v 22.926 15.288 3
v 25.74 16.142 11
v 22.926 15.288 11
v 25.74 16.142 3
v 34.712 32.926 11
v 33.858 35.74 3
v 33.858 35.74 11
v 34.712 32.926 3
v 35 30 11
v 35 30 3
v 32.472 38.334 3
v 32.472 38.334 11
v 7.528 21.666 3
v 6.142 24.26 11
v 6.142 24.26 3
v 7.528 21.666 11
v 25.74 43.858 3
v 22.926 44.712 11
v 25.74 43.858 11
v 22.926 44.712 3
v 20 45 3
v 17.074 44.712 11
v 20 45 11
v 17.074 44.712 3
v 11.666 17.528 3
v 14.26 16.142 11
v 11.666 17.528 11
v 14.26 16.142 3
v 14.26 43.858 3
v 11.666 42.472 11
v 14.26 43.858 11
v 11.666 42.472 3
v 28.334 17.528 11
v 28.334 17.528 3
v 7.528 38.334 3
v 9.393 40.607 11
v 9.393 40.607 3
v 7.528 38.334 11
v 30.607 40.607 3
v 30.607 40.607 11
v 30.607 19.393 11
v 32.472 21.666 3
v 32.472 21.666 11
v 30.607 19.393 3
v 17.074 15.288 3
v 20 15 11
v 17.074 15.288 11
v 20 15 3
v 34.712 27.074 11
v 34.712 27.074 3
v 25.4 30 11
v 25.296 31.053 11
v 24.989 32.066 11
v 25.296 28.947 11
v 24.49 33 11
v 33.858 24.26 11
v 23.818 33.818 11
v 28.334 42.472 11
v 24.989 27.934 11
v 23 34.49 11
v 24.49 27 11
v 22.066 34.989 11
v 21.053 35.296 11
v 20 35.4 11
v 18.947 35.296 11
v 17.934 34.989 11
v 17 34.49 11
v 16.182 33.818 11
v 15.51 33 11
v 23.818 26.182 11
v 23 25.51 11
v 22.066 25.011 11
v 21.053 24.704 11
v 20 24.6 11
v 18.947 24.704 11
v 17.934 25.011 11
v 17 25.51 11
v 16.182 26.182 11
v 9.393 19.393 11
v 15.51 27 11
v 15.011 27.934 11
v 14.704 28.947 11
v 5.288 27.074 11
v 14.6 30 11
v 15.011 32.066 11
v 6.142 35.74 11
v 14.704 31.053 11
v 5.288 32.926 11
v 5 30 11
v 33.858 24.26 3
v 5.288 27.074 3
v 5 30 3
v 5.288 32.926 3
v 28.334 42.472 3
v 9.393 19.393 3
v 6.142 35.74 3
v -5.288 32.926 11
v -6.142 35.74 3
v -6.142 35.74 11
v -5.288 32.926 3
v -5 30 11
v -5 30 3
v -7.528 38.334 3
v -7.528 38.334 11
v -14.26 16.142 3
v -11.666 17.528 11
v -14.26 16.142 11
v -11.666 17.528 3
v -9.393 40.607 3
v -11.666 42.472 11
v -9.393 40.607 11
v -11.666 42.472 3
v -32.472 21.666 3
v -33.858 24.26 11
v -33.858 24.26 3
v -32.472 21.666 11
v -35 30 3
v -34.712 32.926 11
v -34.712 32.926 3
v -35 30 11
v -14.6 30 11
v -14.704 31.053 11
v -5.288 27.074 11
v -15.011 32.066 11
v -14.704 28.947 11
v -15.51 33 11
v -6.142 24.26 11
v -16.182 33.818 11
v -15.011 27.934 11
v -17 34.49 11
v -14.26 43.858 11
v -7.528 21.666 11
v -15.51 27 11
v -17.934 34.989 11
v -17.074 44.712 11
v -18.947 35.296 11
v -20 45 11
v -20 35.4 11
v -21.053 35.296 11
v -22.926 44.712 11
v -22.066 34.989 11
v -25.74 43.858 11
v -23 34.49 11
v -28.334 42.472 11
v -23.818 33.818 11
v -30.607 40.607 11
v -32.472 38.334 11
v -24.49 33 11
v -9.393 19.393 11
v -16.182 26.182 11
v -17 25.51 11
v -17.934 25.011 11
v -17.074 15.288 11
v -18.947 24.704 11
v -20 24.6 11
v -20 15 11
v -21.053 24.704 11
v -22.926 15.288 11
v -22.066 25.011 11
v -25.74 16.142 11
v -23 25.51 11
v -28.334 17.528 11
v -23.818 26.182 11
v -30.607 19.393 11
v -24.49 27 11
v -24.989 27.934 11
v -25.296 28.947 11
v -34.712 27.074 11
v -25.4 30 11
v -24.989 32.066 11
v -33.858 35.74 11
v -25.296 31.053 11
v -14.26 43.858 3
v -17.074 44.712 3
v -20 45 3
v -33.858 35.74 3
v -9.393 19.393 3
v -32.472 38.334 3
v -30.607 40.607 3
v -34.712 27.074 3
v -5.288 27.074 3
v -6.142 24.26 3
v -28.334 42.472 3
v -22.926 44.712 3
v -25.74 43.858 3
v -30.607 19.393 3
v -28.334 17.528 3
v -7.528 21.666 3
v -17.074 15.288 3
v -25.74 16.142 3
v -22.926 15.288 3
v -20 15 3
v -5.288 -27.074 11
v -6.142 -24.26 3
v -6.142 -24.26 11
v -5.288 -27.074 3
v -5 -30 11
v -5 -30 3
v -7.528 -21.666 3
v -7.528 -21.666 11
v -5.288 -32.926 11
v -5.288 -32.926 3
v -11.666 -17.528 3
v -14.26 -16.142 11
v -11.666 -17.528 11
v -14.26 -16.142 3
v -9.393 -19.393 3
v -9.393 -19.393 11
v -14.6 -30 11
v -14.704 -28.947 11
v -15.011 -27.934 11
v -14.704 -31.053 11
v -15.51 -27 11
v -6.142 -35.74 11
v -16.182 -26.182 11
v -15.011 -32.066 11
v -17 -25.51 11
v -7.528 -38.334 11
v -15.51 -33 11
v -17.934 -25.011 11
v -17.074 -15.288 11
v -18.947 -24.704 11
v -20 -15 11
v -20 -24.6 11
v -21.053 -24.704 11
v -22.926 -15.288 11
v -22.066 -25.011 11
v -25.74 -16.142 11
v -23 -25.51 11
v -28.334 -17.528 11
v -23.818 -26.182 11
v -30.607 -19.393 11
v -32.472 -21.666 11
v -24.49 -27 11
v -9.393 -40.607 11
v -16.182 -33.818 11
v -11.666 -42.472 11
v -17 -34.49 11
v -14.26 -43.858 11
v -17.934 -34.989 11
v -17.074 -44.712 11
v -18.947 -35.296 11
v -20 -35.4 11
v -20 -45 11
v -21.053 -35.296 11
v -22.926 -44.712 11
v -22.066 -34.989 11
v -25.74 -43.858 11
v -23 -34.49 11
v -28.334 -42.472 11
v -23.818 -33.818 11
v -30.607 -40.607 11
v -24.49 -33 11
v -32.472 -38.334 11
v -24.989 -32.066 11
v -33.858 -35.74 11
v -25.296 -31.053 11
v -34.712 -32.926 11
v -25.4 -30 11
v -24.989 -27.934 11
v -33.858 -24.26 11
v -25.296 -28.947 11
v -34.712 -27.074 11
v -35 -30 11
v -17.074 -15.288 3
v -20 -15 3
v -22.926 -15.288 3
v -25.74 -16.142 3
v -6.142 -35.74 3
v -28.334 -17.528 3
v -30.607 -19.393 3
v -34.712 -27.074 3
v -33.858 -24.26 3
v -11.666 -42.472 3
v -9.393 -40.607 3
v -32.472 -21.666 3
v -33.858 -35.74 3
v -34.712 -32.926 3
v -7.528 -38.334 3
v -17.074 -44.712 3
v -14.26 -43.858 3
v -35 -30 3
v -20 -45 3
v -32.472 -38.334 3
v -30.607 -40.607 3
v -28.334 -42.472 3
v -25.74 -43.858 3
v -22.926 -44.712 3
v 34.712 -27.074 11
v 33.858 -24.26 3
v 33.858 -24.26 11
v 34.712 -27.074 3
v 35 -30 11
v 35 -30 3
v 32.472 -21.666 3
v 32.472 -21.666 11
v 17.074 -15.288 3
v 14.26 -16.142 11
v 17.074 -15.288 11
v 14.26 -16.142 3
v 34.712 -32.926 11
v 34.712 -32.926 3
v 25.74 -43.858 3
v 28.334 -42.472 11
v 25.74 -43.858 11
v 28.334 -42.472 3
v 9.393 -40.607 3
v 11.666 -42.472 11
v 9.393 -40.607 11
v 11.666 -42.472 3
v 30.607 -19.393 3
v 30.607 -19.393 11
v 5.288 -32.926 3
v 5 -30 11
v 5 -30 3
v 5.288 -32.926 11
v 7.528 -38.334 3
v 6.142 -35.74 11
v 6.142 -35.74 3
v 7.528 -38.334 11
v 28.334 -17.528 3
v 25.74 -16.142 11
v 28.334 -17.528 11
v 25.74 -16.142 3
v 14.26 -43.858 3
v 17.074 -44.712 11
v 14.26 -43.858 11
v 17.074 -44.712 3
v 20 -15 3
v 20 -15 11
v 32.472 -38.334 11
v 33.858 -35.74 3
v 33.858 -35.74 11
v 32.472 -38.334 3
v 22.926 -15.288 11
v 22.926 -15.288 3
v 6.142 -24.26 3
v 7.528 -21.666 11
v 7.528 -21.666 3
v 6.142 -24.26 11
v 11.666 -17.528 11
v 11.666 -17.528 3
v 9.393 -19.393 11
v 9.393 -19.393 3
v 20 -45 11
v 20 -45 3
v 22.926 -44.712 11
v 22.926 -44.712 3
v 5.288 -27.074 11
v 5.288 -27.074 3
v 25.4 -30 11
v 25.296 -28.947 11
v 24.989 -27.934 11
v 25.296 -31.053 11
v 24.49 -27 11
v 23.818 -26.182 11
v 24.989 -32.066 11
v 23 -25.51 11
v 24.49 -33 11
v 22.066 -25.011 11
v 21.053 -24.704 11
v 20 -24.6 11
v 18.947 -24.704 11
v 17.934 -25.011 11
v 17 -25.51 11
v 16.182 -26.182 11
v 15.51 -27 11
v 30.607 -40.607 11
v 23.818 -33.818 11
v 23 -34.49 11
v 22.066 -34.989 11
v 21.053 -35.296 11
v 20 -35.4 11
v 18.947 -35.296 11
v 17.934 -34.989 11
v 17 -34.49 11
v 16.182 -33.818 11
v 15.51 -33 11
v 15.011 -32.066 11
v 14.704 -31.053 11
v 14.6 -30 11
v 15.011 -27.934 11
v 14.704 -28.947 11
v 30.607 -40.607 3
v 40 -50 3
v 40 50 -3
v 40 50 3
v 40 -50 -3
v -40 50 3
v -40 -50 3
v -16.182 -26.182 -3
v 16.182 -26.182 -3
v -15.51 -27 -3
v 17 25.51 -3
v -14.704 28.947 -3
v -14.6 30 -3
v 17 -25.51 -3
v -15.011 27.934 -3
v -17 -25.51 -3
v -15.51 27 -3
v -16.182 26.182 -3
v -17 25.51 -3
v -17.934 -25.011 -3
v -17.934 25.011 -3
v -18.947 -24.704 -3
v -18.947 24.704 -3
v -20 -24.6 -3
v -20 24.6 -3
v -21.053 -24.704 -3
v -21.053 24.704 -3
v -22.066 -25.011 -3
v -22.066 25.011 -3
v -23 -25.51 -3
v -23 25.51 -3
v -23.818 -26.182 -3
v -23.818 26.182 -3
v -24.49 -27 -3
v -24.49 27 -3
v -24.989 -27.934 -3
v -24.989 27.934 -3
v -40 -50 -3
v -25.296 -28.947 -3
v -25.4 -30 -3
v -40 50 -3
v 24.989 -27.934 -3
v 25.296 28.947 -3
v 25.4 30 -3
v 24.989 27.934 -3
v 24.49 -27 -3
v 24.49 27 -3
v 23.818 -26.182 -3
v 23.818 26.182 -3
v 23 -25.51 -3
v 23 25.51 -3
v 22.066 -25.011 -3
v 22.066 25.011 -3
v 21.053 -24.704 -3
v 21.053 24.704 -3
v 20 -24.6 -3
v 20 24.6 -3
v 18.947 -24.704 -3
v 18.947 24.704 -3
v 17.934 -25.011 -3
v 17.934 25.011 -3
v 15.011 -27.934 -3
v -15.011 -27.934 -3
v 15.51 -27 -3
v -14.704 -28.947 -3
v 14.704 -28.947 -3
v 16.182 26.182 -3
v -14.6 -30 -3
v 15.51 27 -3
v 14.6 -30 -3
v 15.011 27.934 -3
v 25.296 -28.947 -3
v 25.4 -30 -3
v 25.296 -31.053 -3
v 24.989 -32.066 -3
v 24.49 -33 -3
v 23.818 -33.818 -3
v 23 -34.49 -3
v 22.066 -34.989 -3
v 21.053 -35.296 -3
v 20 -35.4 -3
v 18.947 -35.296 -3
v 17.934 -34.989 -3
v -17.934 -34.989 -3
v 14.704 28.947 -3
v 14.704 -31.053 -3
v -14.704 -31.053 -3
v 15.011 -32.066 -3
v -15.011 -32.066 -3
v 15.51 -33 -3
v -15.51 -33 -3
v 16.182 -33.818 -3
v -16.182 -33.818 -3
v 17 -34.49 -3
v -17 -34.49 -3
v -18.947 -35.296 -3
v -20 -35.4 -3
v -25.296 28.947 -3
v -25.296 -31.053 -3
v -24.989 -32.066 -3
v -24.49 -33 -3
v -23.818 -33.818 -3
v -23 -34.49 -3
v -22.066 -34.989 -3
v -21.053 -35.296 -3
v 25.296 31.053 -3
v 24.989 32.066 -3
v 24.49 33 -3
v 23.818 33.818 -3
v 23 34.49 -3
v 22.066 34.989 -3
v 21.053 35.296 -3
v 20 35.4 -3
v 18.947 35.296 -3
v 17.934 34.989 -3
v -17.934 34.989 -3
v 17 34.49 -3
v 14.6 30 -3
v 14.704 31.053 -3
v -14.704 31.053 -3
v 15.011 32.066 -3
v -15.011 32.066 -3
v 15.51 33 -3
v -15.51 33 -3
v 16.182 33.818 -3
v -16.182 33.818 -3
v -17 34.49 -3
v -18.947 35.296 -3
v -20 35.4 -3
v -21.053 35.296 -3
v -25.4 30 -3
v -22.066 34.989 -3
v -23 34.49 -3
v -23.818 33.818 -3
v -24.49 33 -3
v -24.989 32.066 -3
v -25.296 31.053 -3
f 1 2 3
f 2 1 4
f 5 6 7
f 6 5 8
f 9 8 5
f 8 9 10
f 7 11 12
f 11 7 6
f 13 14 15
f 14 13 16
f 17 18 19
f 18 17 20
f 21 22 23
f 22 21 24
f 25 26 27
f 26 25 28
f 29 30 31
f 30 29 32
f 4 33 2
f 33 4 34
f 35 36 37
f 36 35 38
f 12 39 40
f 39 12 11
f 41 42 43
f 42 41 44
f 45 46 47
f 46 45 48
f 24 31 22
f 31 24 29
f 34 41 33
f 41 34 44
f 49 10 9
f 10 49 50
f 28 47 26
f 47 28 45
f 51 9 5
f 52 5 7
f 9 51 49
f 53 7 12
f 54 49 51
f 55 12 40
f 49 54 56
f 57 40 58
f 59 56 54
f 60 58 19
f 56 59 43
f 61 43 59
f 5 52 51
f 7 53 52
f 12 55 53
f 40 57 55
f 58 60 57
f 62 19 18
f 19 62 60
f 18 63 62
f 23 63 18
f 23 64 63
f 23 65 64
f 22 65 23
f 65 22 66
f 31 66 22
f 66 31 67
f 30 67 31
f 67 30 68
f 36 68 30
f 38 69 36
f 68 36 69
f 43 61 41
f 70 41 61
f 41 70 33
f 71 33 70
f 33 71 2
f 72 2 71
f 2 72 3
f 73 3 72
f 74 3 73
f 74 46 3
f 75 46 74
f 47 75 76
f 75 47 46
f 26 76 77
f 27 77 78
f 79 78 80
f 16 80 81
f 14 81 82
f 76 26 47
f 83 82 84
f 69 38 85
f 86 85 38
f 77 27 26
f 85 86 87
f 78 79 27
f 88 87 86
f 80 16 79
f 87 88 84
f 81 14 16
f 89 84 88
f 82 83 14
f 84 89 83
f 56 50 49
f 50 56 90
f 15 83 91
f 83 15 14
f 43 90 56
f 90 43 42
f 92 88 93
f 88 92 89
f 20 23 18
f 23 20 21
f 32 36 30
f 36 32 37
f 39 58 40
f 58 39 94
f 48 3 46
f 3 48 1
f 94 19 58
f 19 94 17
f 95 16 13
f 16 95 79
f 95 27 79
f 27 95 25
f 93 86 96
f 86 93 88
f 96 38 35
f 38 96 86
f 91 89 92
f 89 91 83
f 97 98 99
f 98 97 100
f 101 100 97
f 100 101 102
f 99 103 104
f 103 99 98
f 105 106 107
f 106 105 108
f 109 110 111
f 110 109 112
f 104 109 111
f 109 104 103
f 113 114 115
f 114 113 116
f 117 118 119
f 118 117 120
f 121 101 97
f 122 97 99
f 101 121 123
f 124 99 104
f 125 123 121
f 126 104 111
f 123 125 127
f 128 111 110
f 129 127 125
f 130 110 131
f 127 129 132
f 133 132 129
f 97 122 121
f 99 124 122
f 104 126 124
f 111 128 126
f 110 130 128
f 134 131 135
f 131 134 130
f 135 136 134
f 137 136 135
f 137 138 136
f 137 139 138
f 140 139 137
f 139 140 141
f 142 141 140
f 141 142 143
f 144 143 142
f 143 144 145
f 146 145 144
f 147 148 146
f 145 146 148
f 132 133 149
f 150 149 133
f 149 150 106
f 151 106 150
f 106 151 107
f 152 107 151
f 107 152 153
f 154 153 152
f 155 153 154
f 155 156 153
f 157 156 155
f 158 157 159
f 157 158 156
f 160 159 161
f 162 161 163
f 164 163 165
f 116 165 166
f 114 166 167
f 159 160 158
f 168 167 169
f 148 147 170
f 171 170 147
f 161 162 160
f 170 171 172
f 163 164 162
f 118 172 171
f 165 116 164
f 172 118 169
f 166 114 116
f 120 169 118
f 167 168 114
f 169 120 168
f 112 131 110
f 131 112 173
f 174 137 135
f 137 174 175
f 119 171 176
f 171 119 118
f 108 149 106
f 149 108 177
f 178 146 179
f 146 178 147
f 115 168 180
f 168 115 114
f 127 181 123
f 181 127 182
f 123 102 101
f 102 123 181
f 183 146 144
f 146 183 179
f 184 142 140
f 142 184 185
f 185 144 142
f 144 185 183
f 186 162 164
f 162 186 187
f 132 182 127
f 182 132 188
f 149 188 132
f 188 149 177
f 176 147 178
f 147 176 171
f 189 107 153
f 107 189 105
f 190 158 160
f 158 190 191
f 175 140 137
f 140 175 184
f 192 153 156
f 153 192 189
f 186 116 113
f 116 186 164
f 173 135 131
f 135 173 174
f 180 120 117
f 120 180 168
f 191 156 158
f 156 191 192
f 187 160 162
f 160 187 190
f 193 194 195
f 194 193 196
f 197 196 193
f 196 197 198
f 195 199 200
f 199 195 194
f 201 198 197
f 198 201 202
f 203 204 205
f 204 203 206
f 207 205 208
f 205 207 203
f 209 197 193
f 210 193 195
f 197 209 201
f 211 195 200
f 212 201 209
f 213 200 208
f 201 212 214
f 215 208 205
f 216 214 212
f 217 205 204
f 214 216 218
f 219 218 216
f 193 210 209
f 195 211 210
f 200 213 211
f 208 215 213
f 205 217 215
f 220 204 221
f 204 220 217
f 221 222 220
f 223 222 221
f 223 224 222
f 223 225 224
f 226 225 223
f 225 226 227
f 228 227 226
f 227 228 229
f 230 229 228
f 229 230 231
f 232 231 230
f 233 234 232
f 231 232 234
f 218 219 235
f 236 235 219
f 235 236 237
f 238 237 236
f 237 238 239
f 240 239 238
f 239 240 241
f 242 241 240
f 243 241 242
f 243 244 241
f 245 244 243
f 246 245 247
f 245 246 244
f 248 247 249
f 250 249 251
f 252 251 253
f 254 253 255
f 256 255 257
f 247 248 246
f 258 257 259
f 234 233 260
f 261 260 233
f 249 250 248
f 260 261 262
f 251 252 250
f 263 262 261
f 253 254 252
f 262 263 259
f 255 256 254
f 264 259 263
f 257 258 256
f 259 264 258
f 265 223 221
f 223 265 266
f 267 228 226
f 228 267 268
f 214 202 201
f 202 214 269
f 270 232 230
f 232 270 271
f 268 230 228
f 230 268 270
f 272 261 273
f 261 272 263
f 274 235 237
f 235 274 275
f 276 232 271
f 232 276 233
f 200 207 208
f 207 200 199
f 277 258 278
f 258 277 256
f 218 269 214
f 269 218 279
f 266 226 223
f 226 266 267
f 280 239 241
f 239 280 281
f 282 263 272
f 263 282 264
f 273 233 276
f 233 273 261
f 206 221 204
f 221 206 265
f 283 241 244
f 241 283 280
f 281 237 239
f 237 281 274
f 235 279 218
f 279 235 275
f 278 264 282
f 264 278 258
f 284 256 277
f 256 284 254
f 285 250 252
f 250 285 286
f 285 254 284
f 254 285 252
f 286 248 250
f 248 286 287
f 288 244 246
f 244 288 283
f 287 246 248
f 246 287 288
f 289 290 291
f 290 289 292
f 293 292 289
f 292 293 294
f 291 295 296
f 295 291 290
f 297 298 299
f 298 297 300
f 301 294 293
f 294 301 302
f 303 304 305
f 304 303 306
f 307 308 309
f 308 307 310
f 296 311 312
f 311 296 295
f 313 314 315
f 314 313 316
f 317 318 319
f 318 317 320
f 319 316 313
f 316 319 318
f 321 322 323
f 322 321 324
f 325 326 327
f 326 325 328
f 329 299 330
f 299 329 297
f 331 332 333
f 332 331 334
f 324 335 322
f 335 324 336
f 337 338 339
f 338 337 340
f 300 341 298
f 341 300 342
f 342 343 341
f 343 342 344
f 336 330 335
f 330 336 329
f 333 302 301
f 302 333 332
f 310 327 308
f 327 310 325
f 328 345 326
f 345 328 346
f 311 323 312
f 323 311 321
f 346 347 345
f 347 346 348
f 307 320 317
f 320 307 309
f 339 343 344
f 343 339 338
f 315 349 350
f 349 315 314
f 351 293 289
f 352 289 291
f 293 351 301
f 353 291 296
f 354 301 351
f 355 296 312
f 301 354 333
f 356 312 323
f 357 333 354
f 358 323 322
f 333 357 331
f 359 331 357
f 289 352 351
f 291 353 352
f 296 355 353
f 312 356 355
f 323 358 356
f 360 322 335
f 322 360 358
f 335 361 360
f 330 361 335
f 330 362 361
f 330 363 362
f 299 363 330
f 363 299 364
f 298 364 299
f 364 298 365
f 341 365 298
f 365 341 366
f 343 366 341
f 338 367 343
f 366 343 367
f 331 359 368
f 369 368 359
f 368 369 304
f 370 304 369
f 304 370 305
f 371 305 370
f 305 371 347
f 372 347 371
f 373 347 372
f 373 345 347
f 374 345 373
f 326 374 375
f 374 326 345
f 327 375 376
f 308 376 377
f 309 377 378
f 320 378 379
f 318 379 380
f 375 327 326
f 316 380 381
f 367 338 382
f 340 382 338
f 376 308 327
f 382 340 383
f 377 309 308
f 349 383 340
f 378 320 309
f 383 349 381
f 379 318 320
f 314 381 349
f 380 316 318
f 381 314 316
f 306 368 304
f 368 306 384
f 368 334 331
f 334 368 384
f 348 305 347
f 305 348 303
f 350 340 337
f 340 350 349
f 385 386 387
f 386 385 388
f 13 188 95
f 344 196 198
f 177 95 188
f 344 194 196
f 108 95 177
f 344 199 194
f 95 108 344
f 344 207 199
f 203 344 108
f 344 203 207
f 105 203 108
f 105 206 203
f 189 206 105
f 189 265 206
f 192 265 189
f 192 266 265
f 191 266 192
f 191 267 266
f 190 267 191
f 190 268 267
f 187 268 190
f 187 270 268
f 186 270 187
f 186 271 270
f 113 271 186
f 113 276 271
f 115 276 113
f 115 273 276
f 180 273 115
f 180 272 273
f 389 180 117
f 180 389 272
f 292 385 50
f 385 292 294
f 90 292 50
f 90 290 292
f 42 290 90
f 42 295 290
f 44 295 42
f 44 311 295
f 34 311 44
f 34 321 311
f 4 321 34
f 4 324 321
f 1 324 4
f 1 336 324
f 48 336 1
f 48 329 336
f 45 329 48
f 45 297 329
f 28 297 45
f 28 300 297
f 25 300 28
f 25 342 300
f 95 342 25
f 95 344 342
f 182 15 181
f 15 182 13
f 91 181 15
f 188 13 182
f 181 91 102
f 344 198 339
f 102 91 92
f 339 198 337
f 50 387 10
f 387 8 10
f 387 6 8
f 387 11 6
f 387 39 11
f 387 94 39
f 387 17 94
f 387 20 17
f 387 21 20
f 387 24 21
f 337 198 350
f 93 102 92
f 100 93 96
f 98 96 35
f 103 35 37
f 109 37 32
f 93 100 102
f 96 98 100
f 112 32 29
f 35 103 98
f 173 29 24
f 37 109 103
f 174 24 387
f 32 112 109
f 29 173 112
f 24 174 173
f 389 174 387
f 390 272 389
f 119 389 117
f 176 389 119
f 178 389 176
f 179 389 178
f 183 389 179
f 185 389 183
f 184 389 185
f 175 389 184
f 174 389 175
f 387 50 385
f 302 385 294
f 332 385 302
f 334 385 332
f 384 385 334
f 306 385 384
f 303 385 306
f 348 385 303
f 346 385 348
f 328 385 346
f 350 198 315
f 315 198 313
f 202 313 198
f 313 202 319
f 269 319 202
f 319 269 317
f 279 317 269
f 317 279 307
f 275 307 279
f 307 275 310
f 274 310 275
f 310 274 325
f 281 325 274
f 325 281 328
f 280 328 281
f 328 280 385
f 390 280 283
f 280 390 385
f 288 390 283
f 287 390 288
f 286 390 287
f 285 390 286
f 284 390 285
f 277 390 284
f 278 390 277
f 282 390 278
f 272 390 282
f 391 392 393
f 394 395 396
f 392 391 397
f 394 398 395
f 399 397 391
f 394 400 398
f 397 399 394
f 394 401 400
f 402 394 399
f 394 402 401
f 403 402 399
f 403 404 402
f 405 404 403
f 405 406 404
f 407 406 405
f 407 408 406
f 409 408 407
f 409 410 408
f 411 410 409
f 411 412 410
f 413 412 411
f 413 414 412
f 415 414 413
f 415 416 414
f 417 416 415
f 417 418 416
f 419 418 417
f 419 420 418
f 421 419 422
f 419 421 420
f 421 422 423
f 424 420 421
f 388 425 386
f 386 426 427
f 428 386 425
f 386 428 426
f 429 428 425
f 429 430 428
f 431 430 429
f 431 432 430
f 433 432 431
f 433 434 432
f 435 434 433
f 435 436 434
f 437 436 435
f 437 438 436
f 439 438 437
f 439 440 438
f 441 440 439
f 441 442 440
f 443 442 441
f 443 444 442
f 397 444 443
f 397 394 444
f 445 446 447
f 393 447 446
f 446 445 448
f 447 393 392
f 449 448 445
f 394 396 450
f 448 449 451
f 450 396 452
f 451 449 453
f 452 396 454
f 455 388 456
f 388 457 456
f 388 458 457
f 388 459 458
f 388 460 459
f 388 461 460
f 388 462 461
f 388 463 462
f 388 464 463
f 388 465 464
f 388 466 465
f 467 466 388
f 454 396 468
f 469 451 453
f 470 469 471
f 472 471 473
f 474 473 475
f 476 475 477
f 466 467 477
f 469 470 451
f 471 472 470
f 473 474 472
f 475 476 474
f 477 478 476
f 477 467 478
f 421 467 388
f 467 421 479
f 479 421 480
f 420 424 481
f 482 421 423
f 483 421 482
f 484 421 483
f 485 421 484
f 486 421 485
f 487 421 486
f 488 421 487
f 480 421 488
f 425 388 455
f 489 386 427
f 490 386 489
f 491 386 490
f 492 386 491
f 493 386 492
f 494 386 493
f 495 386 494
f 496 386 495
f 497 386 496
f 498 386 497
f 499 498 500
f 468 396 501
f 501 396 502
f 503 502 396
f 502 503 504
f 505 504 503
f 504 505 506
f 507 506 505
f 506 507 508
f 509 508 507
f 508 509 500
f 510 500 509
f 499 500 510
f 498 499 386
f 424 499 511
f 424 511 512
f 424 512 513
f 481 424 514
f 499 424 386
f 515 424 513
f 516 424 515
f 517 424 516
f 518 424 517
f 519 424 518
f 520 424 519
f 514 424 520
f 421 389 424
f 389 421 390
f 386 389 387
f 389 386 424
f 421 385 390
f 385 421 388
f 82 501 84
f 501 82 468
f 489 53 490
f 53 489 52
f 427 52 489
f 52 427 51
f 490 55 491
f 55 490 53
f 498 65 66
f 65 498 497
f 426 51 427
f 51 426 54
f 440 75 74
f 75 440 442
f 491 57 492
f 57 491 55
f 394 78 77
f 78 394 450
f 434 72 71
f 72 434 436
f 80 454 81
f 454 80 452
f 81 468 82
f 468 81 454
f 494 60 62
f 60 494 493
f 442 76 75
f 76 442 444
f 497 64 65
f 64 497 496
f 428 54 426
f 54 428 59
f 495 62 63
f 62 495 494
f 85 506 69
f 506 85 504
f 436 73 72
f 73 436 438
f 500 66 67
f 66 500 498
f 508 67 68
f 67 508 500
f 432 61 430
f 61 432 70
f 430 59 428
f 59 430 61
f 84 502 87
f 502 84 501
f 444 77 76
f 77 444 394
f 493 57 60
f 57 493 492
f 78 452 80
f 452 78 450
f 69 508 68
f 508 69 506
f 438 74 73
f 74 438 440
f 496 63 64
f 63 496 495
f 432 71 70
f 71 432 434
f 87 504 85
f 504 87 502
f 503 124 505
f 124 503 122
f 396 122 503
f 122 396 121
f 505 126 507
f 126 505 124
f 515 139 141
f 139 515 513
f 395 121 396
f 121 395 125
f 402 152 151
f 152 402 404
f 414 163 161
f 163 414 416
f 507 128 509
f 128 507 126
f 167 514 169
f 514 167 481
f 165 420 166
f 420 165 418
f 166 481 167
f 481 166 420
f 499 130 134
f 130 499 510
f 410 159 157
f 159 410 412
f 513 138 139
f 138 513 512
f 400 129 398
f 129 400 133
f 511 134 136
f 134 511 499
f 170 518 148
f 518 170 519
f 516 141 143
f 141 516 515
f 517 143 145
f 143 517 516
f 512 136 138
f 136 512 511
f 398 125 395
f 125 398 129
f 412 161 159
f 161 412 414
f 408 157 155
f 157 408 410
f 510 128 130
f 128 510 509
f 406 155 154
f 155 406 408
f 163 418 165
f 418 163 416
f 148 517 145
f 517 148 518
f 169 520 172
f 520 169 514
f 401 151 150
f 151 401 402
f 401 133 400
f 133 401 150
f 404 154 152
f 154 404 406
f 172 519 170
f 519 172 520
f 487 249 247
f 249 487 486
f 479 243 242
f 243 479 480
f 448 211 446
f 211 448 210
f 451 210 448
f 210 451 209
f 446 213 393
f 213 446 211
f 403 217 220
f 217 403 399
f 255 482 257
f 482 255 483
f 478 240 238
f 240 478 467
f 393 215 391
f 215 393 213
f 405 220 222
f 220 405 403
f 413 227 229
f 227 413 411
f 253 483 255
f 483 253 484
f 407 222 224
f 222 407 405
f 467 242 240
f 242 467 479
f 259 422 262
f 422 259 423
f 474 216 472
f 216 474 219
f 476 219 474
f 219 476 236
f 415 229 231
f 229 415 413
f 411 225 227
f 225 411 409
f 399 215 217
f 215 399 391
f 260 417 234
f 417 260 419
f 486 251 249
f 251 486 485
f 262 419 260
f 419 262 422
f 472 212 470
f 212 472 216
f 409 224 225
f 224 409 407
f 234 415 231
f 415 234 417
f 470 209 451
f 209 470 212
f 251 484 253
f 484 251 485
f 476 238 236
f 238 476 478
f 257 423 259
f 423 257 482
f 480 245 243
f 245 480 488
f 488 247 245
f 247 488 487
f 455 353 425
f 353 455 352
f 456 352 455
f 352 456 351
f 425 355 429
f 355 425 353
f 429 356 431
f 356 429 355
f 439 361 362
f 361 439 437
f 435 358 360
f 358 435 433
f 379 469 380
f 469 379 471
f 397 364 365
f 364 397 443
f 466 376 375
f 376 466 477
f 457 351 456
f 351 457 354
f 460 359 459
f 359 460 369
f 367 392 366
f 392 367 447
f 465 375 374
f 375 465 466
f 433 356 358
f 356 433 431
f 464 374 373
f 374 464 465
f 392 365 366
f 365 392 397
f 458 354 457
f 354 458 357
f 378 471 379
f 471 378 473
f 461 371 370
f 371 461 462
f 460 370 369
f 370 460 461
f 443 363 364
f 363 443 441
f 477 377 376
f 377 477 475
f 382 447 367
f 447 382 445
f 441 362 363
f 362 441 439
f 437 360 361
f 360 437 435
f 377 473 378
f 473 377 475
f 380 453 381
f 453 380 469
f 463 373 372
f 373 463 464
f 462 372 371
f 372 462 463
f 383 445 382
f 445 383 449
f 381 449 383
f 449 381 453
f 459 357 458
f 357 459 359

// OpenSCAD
$fn = 32;

// ----------------------------------------------------------------------
// Anchor pads 80 x 100 x 14
// four corner bosses with anchor holes
// ----------------------------------------------------------------------

// --- parameters (mm) ---
plate = [80, 100, 6];   // base plate size (x, y, z)
pads = 4;               // boss count, one per corner
edge = 20;              // boss centre offset from the plate edge
boss_d = 30;            // boss diameter
boss_h = 8;             // boss height above the base plate
bore_d = 10.5;          // nominal hole diameter from the drawing
print_allowance = 0.3;  // clearance added for printing

// --- derived feature positions (mm) ---
hole_d = bore_d + print_allowance;  // = 10.8   hole diameter as printed
height = plate[2] + boss_h;         // = 14   overall height of the part
corner_x = plate[0] / 2 - edge;     // = 20   boss centre X
corner_y = plate[1] / 2 - edge;     // = 30   boss centre Y
feature_centers = [
  [corner_x, corner_y],
  [-corner_x, corner_y],
  [-corner_x, -corner_y],
  [corner_x, -corner_y]
];   // boss centres, anchor holes are drilled there

// base plate, four bosses standing on it, anchor holes all the way through
difference() {
  union() {
    cube(plate, center = true);
    for (centre = feature_centers)
      translate([centre[0], centre[1], plate[2] / 2 - 1])
        cylinder(d = boss_d, h = boss_h + 1);
  }
  for (centre = feature_centers)
    translate([centre[0], centre[1], -height])
      cylinder(d = hole_d, h = 2 * height + 2);  // through boss and plate
}
